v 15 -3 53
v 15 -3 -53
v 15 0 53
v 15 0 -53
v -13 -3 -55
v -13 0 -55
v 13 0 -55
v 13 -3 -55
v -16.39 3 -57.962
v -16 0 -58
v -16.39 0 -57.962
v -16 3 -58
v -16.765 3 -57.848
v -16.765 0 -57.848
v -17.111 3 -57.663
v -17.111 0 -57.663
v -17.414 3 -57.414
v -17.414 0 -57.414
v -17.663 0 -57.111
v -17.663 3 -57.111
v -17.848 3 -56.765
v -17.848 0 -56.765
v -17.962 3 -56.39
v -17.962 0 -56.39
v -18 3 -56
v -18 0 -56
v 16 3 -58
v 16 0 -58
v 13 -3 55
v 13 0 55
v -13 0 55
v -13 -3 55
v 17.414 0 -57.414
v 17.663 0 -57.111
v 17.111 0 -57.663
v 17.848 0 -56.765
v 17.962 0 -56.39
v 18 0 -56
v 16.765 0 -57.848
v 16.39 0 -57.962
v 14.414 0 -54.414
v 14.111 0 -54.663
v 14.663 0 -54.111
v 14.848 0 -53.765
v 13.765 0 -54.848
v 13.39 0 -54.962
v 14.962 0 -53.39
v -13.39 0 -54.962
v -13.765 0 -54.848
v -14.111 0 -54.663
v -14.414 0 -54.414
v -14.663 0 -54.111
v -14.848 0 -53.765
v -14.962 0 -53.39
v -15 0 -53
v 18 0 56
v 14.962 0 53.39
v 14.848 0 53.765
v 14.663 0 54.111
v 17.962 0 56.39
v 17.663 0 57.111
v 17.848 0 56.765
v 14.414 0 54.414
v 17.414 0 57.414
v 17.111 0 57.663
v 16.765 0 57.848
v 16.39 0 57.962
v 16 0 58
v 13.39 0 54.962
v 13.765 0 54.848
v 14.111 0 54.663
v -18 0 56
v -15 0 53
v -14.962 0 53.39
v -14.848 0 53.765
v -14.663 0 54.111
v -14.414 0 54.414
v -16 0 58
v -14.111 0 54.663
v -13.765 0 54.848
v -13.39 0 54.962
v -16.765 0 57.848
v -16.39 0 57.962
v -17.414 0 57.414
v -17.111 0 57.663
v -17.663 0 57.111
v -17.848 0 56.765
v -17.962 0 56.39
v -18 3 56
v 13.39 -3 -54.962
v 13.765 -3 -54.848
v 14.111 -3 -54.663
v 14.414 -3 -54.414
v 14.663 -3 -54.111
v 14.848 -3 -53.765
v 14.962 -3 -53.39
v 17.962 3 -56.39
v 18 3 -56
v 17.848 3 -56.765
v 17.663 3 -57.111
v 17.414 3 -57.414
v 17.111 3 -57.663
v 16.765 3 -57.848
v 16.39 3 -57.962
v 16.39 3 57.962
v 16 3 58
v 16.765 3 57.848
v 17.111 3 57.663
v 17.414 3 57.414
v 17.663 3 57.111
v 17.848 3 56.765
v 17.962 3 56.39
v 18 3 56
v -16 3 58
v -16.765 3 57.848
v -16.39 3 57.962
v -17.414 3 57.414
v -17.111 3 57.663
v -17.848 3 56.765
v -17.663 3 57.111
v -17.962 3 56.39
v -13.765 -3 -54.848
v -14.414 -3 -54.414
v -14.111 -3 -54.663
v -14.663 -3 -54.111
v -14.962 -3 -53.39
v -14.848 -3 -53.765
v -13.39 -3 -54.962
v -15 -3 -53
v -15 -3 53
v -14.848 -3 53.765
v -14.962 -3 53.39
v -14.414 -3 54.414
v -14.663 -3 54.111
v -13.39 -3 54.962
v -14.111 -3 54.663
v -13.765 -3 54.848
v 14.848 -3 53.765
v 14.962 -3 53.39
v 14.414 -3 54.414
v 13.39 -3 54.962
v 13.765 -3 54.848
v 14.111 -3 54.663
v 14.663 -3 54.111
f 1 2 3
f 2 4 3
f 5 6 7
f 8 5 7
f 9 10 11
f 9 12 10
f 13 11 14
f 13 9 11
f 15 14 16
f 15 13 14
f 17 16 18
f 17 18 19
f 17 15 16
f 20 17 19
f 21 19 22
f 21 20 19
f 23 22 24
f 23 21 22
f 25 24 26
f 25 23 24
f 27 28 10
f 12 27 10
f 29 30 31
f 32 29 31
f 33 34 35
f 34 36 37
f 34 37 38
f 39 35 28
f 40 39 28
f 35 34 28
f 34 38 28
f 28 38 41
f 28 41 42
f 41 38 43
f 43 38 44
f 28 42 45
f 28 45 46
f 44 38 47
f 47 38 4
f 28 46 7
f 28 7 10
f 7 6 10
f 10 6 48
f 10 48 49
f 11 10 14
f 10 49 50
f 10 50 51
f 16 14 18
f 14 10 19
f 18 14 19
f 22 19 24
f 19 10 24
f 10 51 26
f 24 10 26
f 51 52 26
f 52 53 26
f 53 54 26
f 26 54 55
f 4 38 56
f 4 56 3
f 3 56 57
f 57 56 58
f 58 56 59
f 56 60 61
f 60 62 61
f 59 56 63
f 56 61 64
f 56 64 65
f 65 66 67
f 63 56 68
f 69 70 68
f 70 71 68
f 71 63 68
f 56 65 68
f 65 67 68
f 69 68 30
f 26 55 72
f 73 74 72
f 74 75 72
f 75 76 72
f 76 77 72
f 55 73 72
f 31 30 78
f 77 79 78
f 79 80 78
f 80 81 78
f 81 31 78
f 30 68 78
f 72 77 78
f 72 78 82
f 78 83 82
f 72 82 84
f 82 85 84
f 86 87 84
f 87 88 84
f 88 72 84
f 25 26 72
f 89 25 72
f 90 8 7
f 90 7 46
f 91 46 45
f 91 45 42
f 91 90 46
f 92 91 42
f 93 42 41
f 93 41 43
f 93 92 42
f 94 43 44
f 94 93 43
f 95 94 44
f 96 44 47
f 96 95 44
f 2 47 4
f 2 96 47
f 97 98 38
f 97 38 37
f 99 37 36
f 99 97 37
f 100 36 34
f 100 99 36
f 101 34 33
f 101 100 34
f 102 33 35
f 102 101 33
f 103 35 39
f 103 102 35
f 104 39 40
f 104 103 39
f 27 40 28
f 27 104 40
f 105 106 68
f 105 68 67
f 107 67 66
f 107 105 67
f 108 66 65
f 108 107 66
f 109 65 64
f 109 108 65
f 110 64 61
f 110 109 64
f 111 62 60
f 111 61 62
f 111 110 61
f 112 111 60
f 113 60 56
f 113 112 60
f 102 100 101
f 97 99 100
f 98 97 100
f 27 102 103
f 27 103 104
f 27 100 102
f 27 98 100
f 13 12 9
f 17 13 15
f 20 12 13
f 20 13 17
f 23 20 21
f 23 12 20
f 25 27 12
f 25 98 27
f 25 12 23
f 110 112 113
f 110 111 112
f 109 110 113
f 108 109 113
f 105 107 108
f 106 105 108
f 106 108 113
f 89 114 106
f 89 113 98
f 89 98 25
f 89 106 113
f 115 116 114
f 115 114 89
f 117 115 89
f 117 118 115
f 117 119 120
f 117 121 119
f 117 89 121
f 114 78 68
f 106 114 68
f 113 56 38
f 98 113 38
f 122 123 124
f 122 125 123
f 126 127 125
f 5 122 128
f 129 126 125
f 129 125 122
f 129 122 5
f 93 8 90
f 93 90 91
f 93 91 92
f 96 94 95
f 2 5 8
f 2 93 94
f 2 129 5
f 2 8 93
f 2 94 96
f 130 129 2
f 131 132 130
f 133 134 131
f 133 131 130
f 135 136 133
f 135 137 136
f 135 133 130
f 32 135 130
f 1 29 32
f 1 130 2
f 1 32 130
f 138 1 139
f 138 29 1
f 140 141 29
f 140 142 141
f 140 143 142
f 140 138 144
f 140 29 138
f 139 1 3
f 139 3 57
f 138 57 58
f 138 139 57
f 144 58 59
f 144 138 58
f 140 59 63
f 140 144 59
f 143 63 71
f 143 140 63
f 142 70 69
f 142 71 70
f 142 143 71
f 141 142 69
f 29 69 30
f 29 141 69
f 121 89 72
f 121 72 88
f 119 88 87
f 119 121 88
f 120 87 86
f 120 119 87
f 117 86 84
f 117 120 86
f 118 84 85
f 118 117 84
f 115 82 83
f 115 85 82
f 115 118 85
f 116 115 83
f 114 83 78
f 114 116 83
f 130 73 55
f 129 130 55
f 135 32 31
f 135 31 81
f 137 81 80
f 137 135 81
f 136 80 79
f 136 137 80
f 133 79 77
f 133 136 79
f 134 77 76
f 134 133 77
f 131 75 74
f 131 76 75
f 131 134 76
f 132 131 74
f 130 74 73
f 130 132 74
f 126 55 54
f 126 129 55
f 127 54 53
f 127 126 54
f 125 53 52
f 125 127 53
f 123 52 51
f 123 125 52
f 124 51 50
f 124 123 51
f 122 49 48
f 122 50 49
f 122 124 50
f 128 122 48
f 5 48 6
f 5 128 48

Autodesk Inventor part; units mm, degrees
ref_plane "YZ Plane" through (0, 0, 0) normal (1, 0, 0) x (0, 1, 0)
ref_plane "XZ Plane" through (0, 0, 0) normal (0, 1, 0) x (-1, 0, 0)
ref_plane "XY Plane" through (0, 0, 0) normal (0, 0, 1) x (1, 0, 0)
sketch "Sketch1" plane through (0, 0, 0) normal (0, 1, 0) x (-1, 0, 0)
  line L0 (-18, -58) -> (18, -58)
  line L1 (18, -58) -> (18, 58)
  line L2 (18, 58) -> (-18, 58)
  line L3 (-18, 58) -> (-18, -58)
  line L4 (-18, -58) -> (18, 58) construction
  line L5 (18, -58) -> (-18, 58) construction
  point P0 (0, 0)
  dimension "d0" = 36
  dimension "d1" = 116
extrude "Extrusion1" add sketch "Sketch1" along normal blind 3
sketch "Sketch2" plane through (0, 0, 0) normal (0, -1, 0) x (1, 0, 0)
  line L0 (15, 55) -> (-15, 55)
  line L1 (-15, 55) -> (-15, -55)
  line L2 (-15, -55) -> (15, -55)
  line L3 (15, -55) -> (15, 55)
  line L4 (15, 55) -> (-15, -55) construction
  line L5 (-15, 55) -> (15, -55) construction
  line L6 (-18, -58) -> (-18, 58) projected
  line L7 (18, -58) -> (-18, -58) projected
  point P0 (0, 0)
  dimension "d4" = 3
  dimension "d5" = 3
extrude "Extrusion2" add sketch "Sketch2" along normal blind 3
fillet "Fillet1" radius 2 8 edges at (18, 1.5, 58) (15, -1.5, 55) (-15, -1.5, 55) (-18, 1.5, 58) (15, -1.5, -55) (18, 1.5, -58) (-18, 1.5, -58) (-15, -1.5, -55)
properties part number "module-lid_switch"
